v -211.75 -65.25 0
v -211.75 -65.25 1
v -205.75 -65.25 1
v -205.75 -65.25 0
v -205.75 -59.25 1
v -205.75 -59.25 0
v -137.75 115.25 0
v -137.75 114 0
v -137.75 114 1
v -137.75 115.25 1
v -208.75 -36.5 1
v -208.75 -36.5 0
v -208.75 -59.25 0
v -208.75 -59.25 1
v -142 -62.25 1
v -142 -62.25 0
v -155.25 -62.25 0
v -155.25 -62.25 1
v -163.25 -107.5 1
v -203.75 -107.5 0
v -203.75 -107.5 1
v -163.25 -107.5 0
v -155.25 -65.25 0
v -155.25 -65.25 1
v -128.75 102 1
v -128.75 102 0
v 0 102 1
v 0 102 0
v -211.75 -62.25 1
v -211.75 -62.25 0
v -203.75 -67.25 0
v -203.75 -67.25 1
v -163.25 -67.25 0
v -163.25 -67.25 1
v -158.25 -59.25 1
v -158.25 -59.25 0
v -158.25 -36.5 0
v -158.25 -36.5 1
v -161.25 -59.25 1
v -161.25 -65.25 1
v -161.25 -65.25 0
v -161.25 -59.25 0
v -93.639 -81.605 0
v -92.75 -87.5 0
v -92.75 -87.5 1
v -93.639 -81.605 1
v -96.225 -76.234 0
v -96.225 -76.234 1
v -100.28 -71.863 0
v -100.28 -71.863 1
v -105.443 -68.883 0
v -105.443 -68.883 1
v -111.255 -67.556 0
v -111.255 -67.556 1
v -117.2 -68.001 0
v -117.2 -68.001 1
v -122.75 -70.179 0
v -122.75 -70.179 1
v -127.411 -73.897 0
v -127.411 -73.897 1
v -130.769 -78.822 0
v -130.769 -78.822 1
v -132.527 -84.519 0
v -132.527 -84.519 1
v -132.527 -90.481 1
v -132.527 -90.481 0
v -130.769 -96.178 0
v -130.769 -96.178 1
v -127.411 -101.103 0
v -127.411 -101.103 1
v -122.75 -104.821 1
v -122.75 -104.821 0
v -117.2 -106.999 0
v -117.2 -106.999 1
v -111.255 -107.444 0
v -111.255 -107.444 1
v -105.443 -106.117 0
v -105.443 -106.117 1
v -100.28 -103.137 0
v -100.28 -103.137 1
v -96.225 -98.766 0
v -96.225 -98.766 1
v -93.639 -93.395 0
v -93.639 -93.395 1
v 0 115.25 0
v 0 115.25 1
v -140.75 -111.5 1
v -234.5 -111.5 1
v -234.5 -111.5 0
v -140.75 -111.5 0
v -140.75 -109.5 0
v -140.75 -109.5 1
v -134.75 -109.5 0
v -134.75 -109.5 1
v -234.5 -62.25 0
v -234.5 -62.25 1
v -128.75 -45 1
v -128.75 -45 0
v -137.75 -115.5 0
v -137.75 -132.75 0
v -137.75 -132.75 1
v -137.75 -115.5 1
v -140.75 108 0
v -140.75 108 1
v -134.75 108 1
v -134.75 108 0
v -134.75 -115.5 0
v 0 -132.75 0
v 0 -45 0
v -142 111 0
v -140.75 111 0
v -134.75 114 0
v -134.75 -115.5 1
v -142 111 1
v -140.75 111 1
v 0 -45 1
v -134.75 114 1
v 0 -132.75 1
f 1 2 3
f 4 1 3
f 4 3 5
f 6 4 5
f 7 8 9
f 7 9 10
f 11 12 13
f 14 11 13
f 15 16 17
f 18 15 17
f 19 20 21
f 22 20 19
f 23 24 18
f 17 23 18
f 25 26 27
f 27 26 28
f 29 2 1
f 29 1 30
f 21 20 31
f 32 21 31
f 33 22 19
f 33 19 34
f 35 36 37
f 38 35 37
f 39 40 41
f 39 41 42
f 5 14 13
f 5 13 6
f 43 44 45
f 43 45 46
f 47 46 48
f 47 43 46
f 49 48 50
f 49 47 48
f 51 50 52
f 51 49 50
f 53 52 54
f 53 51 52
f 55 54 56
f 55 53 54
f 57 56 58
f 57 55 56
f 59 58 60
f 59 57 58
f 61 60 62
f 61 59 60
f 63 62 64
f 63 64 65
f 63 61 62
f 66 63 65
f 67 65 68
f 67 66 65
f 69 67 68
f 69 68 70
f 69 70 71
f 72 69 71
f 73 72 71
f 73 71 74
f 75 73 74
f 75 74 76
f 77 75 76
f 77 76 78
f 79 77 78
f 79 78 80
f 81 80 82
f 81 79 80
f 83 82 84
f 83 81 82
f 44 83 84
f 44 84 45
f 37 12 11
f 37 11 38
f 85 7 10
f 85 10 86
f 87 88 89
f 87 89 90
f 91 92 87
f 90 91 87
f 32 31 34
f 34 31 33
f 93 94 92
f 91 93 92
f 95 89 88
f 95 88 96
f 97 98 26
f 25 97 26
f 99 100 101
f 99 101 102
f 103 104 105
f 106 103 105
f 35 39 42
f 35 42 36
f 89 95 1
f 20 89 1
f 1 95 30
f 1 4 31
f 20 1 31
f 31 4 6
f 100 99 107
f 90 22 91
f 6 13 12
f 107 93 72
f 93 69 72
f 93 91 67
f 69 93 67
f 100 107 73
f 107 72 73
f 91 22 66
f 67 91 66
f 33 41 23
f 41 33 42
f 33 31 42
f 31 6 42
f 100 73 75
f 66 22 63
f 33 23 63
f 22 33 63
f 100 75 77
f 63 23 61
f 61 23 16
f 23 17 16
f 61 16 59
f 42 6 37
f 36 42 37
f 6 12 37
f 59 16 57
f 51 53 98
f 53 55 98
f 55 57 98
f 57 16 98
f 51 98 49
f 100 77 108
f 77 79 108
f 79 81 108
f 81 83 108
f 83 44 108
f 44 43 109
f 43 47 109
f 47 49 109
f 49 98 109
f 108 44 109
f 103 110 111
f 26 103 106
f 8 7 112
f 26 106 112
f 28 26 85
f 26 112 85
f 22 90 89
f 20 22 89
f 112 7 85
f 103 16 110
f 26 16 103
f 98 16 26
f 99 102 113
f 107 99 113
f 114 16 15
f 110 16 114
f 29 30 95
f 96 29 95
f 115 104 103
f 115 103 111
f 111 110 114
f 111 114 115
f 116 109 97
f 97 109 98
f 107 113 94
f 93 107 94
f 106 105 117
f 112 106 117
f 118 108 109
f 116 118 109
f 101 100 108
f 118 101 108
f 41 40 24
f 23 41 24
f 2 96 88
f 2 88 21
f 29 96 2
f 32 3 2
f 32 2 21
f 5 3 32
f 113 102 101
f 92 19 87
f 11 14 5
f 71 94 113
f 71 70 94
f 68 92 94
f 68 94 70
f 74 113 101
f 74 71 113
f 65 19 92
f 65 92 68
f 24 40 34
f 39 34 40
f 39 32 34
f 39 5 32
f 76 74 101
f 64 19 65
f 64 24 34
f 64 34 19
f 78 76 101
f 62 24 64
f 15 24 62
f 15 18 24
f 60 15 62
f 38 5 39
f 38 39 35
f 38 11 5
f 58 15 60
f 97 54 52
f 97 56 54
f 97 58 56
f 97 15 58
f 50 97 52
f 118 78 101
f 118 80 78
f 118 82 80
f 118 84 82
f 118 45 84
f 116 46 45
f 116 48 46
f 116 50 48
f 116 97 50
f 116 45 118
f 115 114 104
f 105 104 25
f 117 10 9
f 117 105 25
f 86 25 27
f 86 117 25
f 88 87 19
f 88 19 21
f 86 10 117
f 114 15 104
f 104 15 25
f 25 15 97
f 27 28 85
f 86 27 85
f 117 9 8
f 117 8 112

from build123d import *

# Parameters (mm, degrees)
F0_W     = 5.25
F0_H     = 50.25
F0_W_2   = 137.75
F0_H_2   = 20.25
F0_W_3   = 50.5
F0_H_3   = 5.25
F0_H_4   = 4.25
F0_W_4   = 20.5
F0_H_5   = 20.5
F0_W_5   = 4.25
F0_H_6   = 173.25
F0_W_6   = 40.5
F0_H_7   = 40.25
F0_R     = 20
F1_DEPTH = 1
F2_W     = 3
F2_H     = 1
F2_W_2   = 93.75
F2_W_3   = 6
F2_H_2   = 6
F3_DEPTH = 25


with BuildPart() as f1:
    # F0 (on Top) → F1 (new body)
    with BuildSketch(Plane.XY):
        with Locations((-231.875, -87.375)):
            Rectangle(F0_W, F0_H)
        with Locations((-68.875, -122.625)):
            Rectangle(F0_W_2, F0_H_2)
        with Locations((-183.5, -39.125)):
            Rectangle(F0_W_3, F0_H_3)
        with Locations((-68.875, 113.125)):
            Rectangle(F0_W_2, F0_H_4)
        with Locations((-219, -87.375)):
            Rectangle(F0_W_4, F0_H)
        with Locations((-183.5, -52)):
            Rectangle(F0_W_3, F0_H_5)
        with Locations((-139.875, 24.375)):
            Rectangle(F0_W_5, F0_H_6)
        Polygon((-137.75, -112.5), (-137.75, -62.25), (-142, -62.25), (-158.25, -62.25), (-158.25, -112.5), align=None)
        with Locations((-183.5, -87.375)):
            Rectangle(F0_W_3, F0_H)
        with Locations((-183.5, -87.375)):
            Rectangle(F0_W_6, F0_H_7, mode=Mode.SUBTRACT)
        Polygon((0, 102), (0, 111), (-137.75, 111), (-137.75, -62.25), (-137.75, -112.5), (0, -112.5), (0, -45), (-128.75, -45), (-128.75, 102), align=None)
        with Locations((-112.75, -87.5)):
            Circle(F0_R, mode=Mode.SUBTRACT)
    extrude(amount=F1_DEPTH)

    # F2 (on face) → F3 (cut)
    with BuildSketch(Plane.XY.offset(1)):
        Polygon((-134.75, -115.5), (-134.75, -109.5), (-140.75, -109.5), (-140.75, -111.5), (-137.75, -111.5), (-137.75, -112.5), (-140.75, -112.5), (-140.75, -115.5), align=None)
        with Locations((-139.25, -112)):
            Rectangle(F2_W, F2_H)
        with Locations((-187.625, -112)):
            Rectangle(F2_W_2, F2_H)
        with Locations((-158.25, -62.25)):
            Rectangle(F2_W_3, F2_H_2)
        with Locations((-208.75, -62.25)):
            Rectangle(F2_W_3, F2_H_2)
        with Locations((-137.75, 111)):
            Rectangle(F2_W_3, F2_H_2)
    extrude(amount=-F3_DEPTH, mode=Mode.SUBTRACT)


solid = f1.part
